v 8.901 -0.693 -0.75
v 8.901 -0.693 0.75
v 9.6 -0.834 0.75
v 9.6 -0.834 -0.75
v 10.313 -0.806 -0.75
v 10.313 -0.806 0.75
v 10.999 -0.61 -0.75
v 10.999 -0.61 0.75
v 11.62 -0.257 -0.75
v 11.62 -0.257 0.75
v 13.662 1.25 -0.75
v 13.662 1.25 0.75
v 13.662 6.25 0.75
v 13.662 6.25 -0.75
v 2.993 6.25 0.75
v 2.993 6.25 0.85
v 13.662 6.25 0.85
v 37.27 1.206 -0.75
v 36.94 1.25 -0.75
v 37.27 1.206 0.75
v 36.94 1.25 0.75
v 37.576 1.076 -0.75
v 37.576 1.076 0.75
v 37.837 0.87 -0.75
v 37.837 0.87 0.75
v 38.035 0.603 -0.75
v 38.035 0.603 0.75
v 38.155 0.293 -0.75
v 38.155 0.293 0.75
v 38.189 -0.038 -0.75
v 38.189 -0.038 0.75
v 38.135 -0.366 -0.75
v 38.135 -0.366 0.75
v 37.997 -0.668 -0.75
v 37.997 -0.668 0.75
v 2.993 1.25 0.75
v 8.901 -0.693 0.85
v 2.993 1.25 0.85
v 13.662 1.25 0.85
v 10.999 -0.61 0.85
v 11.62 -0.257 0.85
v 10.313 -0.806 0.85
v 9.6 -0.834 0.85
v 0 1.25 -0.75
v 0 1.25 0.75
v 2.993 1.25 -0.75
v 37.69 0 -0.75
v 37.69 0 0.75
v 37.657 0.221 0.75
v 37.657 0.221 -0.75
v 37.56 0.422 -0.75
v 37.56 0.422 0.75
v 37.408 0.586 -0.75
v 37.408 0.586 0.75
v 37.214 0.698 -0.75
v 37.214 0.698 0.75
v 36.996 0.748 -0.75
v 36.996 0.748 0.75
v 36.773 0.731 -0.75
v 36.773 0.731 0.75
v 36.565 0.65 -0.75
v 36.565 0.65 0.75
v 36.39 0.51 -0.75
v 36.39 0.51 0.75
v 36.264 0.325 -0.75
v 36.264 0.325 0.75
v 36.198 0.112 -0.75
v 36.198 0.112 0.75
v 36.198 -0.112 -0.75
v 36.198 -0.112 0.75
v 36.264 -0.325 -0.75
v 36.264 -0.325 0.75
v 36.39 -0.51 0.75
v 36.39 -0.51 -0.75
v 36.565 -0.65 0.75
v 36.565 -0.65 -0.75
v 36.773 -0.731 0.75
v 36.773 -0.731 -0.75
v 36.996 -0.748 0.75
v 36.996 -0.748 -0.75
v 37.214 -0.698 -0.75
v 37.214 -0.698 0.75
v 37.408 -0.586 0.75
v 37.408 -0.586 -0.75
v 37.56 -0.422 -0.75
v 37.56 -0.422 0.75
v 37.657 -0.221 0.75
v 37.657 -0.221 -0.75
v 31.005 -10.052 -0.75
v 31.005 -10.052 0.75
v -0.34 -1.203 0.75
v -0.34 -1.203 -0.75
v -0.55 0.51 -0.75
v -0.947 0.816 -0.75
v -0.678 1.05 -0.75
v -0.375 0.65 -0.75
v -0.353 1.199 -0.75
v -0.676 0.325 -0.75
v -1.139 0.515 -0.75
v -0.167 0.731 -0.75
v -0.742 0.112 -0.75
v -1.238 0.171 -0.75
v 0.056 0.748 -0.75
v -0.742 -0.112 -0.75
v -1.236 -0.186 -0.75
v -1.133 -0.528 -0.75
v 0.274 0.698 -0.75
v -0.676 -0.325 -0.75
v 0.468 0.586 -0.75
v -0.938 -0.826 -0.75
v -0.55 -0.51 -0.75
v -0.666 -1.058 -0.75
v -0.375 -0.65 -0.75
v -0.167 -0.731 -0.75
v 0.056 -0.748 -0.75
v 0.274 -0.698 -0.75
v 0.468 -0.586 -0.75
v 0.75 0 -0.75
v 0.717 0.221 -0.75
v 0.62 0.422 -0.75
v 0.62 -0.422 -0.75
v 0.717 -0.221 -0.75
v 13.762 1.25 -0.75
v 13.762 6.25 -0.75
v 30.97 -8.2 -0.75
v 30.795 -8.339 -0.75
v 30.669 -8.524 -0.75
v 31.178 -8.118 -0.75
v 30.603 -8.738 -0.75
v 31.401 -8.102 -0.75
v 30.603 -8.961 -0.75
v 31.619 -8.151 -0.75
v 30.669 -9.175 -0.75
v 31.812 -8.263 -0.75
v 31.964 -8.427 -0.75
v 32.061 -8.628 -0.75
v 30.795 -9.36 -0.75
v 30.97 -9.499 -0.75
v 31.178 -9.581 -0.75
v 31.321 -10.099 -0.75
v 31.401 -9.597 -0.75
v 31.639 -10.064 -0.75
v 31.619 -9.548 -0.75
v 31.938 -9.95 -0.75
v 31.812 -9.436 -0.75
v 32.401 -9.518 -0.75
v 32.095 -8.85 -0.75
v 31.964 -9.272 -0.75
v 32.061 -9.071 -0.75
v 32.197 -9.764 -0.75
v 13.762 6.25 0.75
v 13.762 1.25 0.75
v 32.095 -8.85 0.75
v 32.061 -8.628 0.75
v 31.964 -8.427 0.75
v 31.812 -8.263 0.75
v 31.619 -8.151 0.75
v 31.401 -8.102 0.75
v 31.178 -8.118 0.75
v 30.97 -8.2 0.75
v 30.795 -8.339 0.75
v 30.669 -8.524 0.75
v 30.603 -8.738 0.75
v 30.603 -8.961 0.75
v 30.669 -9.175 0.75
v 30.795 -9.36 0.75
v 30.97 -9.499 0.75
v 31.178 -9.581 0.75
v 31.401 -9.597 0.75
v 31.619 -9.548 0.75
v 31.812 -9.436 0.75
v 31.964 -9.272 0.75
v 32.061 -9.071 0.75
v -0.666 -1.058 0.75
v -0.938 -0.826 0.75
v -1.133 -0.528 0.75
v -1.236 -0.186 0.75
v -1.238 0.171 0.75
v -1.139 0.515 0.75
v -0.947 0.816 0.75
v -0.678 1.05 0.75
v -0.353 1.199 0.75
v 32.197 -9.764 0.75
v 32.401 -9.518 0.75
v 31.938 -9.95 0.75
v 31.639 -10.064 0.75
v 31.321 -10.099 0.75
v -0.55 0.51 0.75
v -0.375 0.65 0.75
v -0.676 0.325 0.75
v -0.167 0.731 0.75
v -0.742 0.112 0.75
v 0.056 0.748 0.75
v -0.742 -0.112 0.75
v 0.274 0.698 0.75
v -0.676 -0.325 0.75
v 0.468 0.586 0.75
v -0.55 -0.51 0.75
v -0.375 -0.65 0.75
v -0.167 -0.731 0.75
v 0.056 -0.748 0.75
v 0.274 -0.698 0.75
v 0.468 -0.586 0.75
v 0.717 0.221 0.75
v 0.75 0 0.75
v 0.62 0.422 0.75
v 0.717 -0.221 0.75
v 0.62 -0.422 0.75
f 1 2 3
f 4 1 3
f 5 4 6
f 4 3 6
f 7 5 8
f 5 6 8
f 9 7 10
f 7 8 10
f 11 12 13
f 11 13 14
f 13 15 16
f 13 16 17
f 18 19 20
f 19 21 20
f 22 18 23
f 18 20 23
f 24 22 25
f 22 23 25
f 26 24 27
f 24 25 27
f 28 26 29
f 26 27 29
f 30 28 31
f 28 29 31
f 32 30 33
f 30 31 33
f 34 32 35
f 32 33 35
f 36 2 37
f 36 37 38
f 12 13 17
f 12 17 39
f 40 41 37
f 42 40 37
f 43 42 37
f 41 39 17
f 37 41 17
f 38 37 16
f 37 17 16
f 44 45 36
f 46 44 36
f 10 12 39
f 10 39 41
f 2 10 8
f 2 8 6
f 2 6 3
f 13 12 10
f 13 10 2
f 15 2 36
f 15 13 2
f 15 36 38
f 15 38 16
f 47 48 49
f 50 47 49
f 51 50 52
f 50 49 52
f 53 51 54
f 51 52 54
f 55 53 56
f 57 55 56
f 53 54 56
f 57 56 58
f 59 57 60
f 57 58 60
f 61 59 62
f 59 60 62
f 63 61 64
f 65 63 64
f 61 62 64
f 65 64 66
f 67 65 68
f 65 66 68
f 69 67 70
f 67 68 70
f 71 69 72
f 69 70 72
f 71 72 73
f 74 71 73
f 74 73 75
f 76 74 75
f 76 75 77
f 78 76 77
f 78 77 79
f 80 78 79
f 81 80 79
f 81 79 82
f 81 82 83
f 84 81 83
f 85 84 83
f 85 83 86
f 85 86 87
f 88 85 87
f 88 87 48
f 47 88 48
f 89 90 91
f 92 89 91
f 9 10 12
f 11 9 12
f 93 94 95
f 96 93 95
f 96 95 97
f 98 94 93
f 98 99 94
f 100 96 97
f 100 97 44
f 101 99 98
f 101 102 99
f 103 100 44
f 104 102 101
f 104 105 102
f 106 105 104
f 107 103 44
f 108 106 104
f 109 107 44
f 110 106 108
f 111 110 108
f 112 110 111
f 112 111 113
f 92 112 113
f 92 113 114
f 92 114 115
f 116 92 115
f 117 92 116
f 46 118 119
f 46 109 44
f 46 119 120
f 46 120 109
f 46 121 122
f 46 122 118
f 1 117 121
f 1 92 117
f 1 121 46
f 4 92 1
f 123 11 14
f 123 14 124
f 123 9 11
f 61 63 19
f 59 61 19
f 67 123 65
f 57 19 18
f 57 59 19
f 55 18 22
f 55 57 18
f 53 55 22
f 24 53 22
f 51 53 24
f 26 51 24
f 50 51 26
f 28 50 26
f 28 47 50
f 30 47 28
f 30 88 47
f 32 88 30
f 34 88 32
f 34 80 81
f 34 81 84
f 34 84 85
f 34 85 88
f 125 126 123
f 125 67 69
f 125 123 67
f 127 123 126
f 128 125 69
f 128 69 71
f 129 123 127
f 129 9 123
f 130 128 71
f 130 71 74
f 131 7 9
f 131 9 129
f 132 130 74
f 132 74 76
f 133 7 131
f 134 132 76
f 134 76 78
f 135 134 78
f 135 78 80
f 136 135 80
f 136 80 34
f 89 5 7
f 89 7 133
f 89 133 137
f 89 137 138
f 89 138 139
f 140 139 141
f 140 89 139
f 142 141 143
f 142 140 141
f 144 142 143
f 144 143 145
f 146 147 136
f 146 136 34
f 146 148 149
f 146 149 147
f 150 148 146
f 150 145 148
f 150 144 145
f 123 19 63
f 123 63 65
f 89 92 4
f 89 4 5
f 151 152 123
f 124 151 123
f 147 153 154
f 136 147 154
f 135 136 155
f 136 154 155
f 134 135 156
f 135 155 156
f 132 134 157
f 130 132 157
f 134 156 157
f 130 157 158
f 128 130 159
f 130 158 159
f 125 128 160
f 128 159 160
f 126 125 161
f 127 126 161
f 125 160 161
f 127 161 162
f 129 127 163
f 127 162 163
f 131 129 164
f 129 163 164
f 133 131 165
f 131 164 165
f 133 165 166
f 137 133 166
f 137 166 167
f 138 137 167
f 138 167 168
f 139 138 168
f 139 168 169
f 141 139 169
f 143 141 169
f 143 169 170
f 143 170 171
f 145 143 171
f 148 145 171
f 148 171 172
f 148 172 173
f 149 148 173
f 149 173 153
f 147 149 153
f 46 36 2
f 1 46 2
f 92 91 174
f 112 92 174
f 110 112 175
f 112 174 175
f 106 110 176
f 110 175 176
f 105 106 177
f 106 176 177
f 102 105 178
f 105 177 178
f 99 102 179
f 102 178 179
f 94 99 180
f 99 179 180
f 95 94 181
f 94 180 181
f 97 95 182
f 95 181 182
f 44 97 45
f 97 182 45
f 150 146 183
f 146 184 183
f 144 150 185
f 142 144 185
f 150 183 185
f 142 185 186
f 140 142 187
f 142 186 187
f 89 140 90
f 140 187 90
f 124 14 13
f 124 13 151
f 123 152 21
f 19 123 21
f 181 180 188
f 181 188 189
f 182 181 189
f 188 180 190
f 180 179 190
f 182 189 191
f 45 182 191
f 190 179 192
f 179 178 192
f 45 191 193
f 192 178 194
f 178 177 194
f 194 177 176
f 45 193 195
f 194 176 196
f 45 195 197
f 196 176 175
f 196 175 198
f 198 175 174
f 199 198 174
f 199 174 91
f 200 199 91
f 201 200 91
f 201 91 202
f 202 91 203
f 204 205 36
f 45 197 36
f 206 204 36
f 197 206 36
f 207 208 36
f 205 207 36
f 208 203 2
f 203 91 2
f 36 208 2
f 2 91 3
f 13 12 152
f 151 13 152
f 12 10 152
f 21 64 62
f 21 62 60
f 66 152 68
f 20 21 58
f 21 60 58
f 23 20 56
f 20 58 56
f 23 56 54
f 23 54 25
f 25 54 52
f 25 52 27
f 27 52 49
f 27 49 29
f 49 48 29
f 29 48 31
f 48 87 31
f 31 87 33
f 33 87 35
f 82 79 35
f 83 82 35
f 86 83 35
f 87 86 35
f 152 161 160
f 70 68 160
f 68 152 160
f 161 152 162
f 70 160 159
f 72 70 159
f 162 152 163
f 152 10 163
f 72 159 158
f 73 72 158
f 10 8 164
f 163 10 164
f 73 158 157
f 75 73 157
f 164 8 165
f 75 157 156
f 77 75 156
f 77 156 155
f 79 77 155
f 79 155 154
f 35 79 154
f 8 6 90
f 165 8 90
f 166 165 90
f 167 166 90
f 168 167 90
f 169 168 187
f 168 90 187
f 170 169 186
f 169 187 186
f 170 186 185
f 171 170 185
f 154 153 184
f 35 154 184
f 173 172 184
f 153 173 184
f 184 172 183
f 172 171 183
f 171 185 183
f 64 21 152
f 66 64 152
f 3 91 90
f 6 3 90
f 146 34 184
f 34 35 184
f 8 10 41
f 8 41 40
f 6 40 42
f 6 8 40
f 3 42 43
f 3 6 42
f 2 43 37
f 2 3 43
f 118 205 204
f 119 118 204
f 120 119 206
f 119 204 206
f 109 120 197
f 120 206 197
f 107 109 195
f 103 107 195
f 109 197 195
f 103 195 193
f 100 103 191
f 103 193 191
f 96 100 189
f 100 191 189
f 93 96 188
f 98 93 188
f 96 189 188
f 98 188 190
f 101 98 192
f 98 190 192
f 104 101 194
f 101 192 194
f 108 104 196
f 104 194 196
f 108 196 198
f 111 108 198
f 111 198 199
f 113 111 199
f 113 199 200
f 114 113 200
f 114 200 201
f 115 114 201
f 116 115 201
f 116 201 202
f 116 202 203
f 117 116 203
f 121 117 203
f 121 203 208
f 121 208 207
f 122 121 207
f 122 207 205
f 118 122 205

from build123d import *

# Parameters (mm, degrees)
EXTRUDE_1_DEPTH     = 0.75
SKETCH_2_R          = 0.75
CUT_EXTRUDE_1_DEPTH = 11.5
CUT_EXTRUDE_2_DEPTH = 10
SKETCH_5_W          = 0.1
SKETCH_5_H          = 1.5
EXTRUDE_3_DEPTH     = 5
EXTRUDE_4_DEPTH     = 0.1


with BuildPart() as part:
    # 草圖1 → 填料-伸長1 (new, symmetric)
    with BuildSketch(Plane.XY):
        with BuildLine():
            Line((0, 1.25), (36.94, 1.25))
            ThreePointArc((36.94, 1.25), (38.034878383, 0.603109713), (37.99653086, -0.668013878))
            Line((37.99653086, -0.668013878), (32.401246615, -9.517516363))
            ThreePointArc((32.401246615, -9.517516363), (31.791964157, -10.016750901), (31.005081794, -10.052477452))
            Line((31.005081794, -10.052477452), (-0.339633961, -1.202974968))
            ThreePointArc((-0.339633961, -1.202974968), (-1.238187932, 0.171437001), (0, 1.25))
        make_face()
    extrude(amount=EXTRUDE_1_DEPTH, both=True)

    # 草圖2 → 除料-伸長1 (cut)
    with BuildSketch(Plane.XY.offset(0.75)):
        with Locations((31.344715755, -8.849502484)):
            Circle(SKETCH_2_R)
        with Locations((36.94, 0)):
            Circle(SKETCH_2_R)
        Circle(SKETCH_2_R)
    extrude(amount=-CUT_EXTRUDE_1_DEPTH, mode=Mode.SUBTRACT)

    # 草圖3 → 除料-伸長2 (cut)
    with BuildSketch(Plane.XY.offset(0.75)):
        with BuildLine():
            Line((2.992512824, 1.25), (8.900901485, -0.693316422))
            ThreePointArc((8.900901485, -0.693316422), (10.31317825, -0.80567075), (11.61953303, -0.257413197))
            Line((11.61953303, -0.257413197), (13.662279188, 1.25))
            Line((13.662279188, 1.25), (2.992512824, 1.25))
        make_face()
    extrude(amount=-CUT_EXTRUDE_2_DEPTH, mode=Mode.SUBTRACT)

    # 草圖5 → 填料-伸長3 (add)
    with BuildSketch(Plane(origin=(0, 1.25, 0), x_dir=(1, 0, 0), z_dir=(0, 1, 0))):
        with Locations((13.712279188, 0)):
            Rectangle(SKETCH_5_W, SKETCH_5_H)
    extrude(amount=EXTRUDE_3_DEPTH)


with BuildPart() as body_2:
    # 草圖6 → 填料-伸長4 (new body)
    with BuildSketch(Plane.XY.offset(0.75)):
        with BuildLine():
            Line((13.662279188, 6.25), (13.662279188, 1.25))
            Line((13.662279188, 1.25), (11.61953303, -0.257413197))
            ThreePointArc((11.61953303, -0.257413197), (10.31317825, -0.80567075), (8.900901485, -0.693316422))
            Line((8.900901485, -0.693316422), (2.992512824, 1.25))
            Line((2.992512824, 1.25), (2.992512824, 6.25))
            Line((2.992512824, 6.25), (13.662279188, 6.25))
        make_face()
    extrude(amount=EXTRUDE_4_DEPTH)


solid = Compound([part.part, body_2.part])
